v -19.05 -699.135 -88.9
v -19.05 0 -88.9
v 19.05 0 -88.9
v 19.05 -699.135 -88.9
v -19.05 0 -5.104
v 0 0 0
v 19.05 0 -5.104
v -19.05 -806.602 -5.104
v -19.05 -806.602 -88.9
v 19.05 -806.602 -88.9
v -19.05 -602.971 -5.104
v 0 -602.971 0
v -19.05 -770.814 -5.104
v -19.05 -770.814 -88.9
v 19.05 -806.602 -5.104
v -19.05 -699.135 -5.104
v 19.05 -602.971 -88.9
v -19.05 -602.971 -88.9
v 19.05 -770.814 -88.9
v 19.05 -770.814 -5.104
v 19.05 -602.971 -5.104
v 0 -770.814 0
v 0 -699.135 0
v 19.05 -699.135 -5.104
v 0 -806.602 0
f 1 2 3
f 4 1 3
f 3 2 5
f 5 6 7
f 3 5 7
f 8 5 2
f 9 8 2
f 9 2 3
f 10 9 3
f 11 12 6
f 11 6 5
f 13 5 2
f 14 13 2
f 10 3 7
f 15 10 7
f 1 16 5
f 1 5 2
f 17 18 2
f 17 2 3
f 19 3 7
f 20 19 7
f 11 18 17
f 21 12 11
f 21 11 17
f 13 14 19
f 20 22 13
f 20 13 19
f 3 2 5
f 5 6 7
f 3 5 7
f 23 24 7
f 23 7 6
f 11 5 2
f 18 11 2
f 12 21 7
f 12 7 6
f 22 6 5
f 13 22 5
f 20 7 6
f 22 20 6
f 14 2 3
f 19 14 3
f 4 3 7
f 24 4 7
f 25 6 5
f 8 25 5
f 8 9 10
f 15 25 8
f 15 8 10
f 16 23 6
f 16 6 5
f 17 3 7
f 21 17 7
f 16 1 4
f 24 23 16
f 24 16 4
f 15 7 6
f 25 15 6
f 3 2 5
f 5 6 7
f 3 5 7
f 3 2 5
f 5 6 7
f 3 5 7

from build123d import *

# Parameters (mm, degrees)
F1_DEPTH = 602.9706
F2_DEPTH = 699.135
F3_DEPTH = 770.8138
F4_DEPTH = 806.6024


with BuildPart() as f1:
    # F0 (on Front) → F1 (new body)
    with BuildSketch(Plane.XZ):
        Polygon((19.05, -5.104432), (0, 0), (-19.05, -5.104432), (-19.05, -88.9), (19.05, -88.9), align=None)
    extrude(amount=F1_DEPTH)


with BuildPart() as f2:
    # F0 (on Front) → F2 (new body)
    with BuildSketch(Plane.XZ):
        Polygon((19.05, -5.104432), (0, 0), (-19.05, -5.104432), (-19.05, -88.9), (19.05, -88.9), align=None)
    extrude(amount=F2_DEPTH)


with BuildPart() as f3:
    # F0 (on Front) → F3 (new body)
    with BuildSketch(Plane.XZ):
        Polygon((19.05, -5.104432), (0, 0), (-19.05, -5.104432), (-19.05, -88.9), (19.05, -88.9), align=None)
    extrude(amount=F3_DEPTH)


with BuildPart() as f4:
    # F0 (on Front) → F4 (new body)
    with BuildSketch(Plane.XZ):
        Polygon((19.05, -5.104432), (0, 0), (-19.05, -5.104432), (-19.05, -88.9), (19.05, -88.9), align=None)
    extrude(amount=F4_DEPTH)


solid = Compound([f1.part, f2.part, f3.part, f4.part])
